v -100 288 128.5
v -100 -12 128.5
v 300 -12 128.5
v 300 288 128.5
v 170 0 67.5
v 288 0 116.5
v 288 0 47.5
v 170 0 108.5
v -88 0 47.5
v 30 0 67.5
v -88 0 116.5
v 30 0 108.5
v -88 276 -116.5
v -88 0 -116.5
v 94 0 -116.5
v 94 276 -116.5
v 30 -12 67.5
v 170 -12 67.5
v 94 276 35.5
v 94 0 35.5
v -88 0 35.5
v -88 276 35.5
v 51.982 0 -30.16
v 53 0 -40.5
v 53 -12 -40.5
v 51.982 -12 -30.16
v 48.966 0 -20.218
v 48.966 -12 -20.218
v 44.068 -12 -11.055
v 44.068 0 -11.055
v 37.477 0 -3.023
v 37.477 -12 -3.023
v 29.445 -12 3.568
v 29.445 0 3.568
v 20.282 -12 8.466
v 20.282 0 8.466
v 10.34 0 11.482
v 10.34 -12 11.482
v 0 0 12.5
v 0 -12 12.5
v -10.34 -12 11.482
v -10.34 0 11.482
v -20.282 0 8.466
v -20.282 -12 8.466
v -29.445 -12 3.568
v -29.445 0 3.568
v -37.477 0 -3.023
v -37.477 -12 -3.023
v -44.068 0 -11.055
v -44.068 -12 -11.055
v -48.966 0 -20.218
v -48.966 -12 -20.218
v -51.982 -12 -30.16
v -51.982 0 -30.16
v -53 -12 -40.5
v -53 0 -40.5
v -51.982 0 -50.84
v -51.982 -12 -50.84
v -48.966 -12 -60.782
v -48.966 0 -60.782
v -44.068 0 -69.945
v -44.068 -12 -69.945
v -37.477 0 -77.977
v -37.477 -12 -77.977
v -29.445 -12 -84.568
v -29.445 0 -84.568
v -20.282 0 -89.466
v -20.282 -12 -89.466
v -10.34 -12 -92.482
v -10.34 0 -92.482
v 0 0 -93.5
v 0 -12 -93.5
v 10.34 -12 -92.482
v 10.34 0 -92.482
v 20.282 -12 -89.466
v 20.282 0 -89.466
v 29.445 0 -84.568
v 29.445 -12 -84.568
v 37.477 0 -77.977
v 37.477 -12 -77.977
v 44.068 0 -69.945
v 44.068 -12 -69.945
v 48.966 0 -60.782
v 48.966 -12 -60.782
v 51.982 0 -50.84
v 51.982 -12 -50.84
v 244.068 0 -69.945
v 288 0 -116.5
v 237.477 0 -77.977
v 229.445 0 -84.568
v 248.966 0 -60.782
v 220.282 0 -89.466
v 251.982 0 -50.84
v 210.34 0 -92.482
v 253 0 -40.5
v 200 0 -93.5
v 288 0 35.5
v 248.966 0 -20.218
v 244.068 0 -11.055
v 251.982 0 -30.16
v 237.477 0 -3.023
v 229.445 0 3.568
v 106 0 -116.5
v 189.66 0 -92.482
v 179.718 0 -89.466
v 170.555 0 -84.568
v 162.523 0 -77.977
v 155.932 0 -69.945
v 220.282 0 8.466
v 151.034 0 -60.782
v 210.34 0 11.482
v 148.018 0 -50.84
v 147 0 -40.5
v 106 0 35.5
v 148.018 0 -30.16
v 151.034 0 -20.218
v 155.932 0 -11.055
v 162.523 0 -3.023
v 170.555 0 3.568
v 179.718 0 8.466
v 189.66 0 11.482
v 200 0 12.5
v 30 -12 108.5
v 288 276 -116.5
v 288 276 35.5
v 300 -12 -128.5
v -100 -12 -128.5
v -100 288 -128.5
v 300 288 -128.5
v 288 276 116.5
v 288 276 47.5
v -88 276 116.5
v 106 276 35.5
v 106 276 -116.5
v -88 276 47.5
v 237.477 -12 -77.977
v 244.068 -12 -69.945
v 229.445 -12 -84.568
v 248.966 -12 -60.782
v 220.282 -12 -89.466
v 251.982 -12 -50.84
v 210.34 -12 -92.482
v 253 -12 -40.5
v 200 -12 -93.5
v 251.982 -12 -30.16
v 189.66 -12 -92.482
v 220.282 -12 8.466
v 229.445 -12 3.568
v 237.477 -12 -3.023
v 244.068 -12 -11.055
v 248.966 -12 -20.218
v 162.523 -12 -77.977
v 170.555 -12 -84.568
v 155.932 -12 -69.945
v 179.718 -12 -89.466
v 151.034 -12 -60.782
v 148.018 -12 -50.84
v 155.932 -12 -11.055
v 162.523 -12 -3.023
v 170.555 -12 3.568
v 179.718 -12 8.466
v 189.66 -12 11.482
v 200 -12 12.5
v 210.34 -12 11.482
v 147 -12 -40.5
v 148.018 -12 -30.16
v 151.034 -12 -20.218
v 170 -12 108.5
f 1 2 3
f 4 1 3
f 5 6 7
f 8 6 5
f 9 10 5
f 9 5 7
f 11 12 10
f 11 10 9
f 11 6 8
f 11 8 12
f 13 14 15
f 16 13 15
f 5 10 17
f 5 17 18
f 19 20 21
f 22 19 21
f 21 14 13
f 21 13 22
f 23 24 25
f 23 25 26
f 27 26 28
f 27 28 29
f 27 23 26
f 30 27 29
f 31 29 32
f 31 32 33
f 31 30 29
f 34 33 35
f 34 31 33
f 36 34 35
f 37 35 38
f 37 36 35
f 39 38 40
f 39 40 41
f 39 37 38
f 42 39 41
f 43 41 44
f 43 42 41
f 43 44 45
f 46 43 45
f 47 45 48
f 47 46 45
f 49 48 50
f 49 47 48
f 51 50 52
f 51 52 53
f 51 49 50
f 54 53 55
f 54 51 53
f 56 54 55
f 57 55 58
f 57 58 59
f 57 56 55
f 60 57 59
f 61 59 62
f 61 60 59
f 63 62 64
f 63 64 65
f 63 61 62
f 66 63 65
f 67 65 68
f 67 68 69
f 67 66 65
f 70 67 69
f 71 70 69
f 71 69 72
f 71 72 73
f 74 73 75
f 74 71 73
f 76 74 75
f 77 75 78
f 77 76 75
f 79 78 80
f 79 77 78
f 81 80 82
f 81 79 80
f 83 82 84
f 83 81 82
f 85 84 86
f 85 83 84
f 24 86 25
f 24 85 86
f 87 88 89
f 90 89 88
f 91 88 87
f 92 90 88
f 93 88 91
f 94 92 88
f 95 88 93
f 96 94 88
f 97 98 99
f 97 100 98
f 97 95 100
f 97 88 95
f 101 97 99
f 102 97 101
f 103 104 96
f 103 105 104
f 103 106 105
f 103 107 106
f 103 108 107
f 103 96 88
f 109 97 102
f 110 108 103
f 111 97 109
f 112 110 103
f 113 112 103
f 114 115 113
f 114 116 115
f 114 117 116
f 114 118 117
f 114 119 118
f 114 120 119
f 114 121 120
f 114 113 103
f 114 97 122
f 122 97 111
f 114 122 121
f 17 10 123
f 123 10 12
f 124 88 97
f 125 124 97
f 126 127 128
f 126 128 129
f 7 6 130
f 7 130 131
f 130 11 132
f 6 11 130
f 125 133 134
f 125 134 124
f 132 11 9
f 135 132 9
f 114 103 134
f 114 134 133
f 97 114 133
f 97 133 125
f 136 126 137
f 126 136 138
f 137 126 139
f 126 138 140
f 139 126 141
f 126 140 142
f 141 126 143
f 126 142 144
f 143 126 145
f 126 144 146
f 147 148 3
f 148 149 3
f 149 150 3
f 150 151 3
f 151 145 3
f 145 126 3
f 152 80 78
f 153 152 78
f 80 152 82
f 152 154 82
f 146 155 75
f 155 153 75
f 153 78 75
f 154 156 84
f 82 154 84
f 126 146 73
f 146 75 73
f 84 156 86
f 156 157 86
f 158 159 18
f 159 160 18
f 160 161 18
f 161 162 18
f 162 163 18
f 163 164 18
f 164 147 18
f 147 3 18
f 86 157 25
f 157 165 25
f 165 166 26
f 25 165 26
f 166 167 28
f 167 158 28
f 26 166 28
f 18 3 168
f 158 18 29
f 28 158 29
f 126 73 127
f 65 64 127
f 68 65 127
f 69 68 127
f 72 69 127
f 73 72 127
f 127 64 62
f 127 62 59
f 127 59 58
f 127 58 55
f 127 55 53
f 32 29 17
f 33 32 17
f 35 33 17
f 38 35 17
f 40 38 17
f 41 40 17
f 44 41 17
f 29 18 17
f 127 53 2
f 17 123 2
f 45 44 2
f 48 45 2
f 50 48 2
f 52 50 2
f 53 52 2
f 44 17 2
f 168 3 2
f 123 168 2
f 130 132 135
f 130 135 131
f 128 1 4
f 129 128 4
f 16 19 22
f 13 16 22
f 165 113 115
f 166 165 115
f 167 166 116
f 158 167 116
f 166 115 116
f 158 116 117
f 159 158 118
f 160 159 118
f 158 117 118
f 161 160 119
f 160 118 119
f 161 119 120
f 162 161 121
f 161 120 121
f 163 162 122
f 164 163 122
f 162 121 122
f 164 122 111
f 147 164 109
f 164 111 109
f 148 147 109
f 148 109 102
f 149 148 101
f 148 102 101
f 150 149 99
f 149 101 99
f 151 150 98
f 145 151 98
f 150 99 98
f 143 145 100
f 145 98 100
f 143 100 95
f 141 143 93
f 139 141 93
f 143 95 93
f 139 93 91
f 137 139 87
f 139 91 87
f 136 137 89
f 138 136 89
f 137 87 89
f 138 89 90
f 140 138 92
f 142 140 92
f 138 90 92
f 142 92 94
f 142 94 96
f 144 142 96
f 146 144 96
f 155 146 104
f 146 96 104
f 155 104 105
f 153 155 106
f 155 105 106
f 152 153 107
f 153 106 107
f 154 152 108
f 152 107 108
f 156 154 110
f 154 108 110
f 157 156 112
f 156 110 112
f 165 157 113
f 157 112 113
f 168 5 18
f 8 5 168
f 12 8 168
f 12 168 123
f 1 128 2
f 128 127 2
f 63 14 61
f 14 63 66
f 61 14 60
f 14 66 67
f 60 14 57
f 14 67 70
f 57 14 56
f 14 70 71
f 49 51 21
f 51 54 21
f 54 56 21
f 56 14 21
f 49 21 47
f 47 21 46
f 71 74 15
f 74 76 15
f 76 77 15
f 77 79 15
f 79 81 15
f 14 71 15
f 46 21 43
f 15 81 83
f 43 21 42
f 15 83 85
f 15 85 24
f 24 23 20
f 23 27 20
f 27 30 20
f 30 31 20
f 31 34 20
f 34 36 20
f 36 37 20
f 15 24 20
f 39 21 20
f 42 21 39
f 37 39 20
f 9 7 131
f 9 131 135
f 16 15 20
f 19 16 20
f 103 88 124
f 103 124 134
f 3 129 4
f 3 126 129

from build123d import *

# Parameters (mm, degrees)
F0_W     = 200
F0_H     = 164
F0_R     = 67
F0_H_2   = 12
F0_R_2   = 53
F1_DEPTH = 12
F2_W     = 12
F2_H     = 69
F2_H_2   = 12
F2_H_3   = 152
F2_W_2   = 6
F3_DEPTH = 276
F4_W     = 200
F4_H     = 257
F5_DEPTH = 12


with BuildPart() as f1:
    # F0 (on Front) → F1 (new body)
    with BuildSketch(Plane.XZ):
        with Locations((0, -46.5)):
            Rectangle(F0_W, F0_H)
        with Locations((0, -40.5)):
            Circle(F0_R, mode=Mode.SUBTRACT)
        Polygon((100, 128.5), (-100, 128.5), (-100, 47.5), (100, 47.5), (100, 67.5), (30, 67.5), (30, 108.5), (100, 108.5), align=None)
        with Locations((0, 41.5)):
            Rectangle(F0_W, F0_H_2)
        with Locations((0, -40.5)):
            Circle(F0_R)
        with Locations((0, -40.5)):
            Circle(F0_R_2, mode=Mode.SUBTRACT)
    extrude(amount=F1_DEPTH)

    # F2 (on face) → F3 (join)
    with BuildSketch(Plane(origin=(0, 0, 0), x_dir=(-1, 0, 0), z_dir=(0, 1, 0))):
        Polygon((100, 128.5), (-100, 128.5), (-100, 116.5), (88, 116.5), (100, 116.5), align=None)
        with Locations((94, 82)):
            Rectangle(F2_W, F2_H)
        with Locations((94, 41.5)):
            Rectangle(F2_W, F2_H_2)
        Polygon((88, 35.5), (88, 47.5), (-100, 47.5), (-100, 35.5), (-94, 35.5), align=None)
        with Locations((94, -40.5)):
            Rectangle(F2_W, F2_H_3)
        Polygon((100, -128.5), (100, -116.5), (88, -116.5), (-94, -116.5), (-100, -116.5), (-100, -128.5), align=None)
        with Locations((-97, -40.5)):
            Rectangle(F2_W_2, F2_H_3)
    extrude(amount=F3_DEPTH)

    # F4 (on face) → F5 (join)
    with BuildSketch(Plane(origin=(0, 276, 0), x_dir=(-1, 0, 0), z_dir=(0, 1, 0))):
        Rectangle(F4_W, F4_H)
    extrude(amount=F5_DEPTH)

    # F6: F1 across face


with BuildPart() as f1_1:
    add(f1.part)
    add(f1.part.mirror(Plane(origin=(100, 139.230769, -27.880342), x_dir=(0, 1, 0), z_dir=(1, 0, 0))))


solid = f1_1.part
